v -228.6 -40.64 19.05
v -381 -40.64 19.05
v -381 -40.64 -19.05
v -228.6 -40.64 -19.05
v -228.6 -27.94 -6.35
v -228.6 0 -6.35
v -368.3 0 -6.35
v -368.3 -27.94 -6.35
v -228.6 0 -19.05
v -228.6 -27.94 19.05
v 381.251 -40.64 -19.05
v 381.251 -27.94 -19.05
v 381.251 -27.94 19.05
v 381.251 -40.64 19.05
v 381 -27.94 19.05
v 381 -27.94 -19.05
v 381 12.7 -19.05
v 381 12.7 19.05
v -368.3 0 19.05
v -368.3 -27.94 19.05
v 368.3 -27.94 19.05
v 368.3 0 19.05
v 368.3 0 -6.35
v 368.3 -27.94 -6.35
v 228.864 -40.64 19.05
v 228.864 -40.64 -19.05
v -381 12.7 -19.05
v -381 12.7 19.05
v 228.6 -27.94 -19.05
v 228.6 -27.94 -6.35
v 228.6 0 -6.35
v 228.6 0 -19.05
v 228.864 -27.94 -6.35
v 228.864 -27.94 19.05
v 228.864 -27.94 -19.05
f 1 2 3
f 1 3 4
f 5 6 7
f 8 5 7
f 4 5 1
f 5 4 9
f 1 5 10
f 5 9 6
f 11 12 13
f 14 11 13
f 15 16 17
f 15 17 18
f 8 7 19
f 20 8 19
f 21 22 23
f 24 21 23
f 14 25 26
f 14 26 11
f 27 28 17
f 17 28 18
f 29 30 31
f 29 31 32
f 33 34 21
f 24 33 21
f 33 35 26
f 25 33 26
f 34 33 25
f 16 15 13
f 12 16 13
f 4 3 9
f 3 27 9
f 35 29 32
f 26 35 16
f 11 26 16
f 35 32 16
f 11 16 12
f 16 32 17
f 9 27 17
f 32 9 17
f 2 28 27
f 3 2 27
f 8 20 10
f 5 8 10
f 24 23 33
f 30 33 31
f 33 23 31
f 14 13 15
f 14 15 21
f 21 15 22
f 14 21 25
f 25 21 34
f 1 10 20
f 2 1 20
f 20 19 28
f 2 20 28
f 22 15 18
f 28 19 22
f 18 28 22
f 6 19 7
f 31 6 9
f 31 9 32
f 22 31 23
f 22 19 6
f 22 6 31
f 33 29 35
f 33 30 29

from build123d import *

# Parameters (mm, degrees)
F1_DEPTH = 12.7
F2_DEPTH = 27.94
F3_W     = 152.38668
F3_H     = 38.1
F4_DEPTH = 12.7


with BuildPart() as f1:
    # F0 (on Front) → F1 (new body)
    with BuildSketch(Plane.XZ):
        Polygon((368.3, 19.05), (-368.3, 19.05), (-368.3, -6.35), (-228.6, -6.35), (-228.6, -19.05), (228.6, -19.05), (228.6, -6.35), (368.3, -6.35), align=None)
        Polygon((-368.3, 19.05), (-381, 19.05), (-381, -19.05), (-228.6, -19.05), (-228.6, -6.35), (-368.3, -6.35), align=None)
        Polygon((381, 19.05), (368.3, 19.05), (368.3, -6.35), (228.6, -6.35), (228.6, -19.05), (381, -19.05), align=None)
    extrude(amount=-F1_DEPTH)

    # F0 (on Front) → F2 (join)
    with BuildSketch(Plane.XZ):
        Polygon((-368.3, 19.05), (-381, 19.05), (-381, -19.05), (-228.6, -19.05), (-228.6, -6.35), (-368.3, -6.35), align=None)
        Polygon((381, 19.05), (368.3, 19.05), (368.3, -6.35), (228.6, -6.35), (228.6, -19.05), (381, -19.05), align=None)
    extrude(amount=F2_DEPTH)

    # F3 (on face) → F4 (join)
    with BuildSketch(Plane.XZ.offset(27.94)):
        Polygon((-368.3, 19.05), (-381, 19.05), (-381, -19.05), (-228.6, -19.05), (-228.6, 19.05), align=None)
        with Locations((305.05722, 0)):
            Rectangle(F3_W, F3_H)
    extrude(amount=F4_DEPTH)


solid = f1.part
